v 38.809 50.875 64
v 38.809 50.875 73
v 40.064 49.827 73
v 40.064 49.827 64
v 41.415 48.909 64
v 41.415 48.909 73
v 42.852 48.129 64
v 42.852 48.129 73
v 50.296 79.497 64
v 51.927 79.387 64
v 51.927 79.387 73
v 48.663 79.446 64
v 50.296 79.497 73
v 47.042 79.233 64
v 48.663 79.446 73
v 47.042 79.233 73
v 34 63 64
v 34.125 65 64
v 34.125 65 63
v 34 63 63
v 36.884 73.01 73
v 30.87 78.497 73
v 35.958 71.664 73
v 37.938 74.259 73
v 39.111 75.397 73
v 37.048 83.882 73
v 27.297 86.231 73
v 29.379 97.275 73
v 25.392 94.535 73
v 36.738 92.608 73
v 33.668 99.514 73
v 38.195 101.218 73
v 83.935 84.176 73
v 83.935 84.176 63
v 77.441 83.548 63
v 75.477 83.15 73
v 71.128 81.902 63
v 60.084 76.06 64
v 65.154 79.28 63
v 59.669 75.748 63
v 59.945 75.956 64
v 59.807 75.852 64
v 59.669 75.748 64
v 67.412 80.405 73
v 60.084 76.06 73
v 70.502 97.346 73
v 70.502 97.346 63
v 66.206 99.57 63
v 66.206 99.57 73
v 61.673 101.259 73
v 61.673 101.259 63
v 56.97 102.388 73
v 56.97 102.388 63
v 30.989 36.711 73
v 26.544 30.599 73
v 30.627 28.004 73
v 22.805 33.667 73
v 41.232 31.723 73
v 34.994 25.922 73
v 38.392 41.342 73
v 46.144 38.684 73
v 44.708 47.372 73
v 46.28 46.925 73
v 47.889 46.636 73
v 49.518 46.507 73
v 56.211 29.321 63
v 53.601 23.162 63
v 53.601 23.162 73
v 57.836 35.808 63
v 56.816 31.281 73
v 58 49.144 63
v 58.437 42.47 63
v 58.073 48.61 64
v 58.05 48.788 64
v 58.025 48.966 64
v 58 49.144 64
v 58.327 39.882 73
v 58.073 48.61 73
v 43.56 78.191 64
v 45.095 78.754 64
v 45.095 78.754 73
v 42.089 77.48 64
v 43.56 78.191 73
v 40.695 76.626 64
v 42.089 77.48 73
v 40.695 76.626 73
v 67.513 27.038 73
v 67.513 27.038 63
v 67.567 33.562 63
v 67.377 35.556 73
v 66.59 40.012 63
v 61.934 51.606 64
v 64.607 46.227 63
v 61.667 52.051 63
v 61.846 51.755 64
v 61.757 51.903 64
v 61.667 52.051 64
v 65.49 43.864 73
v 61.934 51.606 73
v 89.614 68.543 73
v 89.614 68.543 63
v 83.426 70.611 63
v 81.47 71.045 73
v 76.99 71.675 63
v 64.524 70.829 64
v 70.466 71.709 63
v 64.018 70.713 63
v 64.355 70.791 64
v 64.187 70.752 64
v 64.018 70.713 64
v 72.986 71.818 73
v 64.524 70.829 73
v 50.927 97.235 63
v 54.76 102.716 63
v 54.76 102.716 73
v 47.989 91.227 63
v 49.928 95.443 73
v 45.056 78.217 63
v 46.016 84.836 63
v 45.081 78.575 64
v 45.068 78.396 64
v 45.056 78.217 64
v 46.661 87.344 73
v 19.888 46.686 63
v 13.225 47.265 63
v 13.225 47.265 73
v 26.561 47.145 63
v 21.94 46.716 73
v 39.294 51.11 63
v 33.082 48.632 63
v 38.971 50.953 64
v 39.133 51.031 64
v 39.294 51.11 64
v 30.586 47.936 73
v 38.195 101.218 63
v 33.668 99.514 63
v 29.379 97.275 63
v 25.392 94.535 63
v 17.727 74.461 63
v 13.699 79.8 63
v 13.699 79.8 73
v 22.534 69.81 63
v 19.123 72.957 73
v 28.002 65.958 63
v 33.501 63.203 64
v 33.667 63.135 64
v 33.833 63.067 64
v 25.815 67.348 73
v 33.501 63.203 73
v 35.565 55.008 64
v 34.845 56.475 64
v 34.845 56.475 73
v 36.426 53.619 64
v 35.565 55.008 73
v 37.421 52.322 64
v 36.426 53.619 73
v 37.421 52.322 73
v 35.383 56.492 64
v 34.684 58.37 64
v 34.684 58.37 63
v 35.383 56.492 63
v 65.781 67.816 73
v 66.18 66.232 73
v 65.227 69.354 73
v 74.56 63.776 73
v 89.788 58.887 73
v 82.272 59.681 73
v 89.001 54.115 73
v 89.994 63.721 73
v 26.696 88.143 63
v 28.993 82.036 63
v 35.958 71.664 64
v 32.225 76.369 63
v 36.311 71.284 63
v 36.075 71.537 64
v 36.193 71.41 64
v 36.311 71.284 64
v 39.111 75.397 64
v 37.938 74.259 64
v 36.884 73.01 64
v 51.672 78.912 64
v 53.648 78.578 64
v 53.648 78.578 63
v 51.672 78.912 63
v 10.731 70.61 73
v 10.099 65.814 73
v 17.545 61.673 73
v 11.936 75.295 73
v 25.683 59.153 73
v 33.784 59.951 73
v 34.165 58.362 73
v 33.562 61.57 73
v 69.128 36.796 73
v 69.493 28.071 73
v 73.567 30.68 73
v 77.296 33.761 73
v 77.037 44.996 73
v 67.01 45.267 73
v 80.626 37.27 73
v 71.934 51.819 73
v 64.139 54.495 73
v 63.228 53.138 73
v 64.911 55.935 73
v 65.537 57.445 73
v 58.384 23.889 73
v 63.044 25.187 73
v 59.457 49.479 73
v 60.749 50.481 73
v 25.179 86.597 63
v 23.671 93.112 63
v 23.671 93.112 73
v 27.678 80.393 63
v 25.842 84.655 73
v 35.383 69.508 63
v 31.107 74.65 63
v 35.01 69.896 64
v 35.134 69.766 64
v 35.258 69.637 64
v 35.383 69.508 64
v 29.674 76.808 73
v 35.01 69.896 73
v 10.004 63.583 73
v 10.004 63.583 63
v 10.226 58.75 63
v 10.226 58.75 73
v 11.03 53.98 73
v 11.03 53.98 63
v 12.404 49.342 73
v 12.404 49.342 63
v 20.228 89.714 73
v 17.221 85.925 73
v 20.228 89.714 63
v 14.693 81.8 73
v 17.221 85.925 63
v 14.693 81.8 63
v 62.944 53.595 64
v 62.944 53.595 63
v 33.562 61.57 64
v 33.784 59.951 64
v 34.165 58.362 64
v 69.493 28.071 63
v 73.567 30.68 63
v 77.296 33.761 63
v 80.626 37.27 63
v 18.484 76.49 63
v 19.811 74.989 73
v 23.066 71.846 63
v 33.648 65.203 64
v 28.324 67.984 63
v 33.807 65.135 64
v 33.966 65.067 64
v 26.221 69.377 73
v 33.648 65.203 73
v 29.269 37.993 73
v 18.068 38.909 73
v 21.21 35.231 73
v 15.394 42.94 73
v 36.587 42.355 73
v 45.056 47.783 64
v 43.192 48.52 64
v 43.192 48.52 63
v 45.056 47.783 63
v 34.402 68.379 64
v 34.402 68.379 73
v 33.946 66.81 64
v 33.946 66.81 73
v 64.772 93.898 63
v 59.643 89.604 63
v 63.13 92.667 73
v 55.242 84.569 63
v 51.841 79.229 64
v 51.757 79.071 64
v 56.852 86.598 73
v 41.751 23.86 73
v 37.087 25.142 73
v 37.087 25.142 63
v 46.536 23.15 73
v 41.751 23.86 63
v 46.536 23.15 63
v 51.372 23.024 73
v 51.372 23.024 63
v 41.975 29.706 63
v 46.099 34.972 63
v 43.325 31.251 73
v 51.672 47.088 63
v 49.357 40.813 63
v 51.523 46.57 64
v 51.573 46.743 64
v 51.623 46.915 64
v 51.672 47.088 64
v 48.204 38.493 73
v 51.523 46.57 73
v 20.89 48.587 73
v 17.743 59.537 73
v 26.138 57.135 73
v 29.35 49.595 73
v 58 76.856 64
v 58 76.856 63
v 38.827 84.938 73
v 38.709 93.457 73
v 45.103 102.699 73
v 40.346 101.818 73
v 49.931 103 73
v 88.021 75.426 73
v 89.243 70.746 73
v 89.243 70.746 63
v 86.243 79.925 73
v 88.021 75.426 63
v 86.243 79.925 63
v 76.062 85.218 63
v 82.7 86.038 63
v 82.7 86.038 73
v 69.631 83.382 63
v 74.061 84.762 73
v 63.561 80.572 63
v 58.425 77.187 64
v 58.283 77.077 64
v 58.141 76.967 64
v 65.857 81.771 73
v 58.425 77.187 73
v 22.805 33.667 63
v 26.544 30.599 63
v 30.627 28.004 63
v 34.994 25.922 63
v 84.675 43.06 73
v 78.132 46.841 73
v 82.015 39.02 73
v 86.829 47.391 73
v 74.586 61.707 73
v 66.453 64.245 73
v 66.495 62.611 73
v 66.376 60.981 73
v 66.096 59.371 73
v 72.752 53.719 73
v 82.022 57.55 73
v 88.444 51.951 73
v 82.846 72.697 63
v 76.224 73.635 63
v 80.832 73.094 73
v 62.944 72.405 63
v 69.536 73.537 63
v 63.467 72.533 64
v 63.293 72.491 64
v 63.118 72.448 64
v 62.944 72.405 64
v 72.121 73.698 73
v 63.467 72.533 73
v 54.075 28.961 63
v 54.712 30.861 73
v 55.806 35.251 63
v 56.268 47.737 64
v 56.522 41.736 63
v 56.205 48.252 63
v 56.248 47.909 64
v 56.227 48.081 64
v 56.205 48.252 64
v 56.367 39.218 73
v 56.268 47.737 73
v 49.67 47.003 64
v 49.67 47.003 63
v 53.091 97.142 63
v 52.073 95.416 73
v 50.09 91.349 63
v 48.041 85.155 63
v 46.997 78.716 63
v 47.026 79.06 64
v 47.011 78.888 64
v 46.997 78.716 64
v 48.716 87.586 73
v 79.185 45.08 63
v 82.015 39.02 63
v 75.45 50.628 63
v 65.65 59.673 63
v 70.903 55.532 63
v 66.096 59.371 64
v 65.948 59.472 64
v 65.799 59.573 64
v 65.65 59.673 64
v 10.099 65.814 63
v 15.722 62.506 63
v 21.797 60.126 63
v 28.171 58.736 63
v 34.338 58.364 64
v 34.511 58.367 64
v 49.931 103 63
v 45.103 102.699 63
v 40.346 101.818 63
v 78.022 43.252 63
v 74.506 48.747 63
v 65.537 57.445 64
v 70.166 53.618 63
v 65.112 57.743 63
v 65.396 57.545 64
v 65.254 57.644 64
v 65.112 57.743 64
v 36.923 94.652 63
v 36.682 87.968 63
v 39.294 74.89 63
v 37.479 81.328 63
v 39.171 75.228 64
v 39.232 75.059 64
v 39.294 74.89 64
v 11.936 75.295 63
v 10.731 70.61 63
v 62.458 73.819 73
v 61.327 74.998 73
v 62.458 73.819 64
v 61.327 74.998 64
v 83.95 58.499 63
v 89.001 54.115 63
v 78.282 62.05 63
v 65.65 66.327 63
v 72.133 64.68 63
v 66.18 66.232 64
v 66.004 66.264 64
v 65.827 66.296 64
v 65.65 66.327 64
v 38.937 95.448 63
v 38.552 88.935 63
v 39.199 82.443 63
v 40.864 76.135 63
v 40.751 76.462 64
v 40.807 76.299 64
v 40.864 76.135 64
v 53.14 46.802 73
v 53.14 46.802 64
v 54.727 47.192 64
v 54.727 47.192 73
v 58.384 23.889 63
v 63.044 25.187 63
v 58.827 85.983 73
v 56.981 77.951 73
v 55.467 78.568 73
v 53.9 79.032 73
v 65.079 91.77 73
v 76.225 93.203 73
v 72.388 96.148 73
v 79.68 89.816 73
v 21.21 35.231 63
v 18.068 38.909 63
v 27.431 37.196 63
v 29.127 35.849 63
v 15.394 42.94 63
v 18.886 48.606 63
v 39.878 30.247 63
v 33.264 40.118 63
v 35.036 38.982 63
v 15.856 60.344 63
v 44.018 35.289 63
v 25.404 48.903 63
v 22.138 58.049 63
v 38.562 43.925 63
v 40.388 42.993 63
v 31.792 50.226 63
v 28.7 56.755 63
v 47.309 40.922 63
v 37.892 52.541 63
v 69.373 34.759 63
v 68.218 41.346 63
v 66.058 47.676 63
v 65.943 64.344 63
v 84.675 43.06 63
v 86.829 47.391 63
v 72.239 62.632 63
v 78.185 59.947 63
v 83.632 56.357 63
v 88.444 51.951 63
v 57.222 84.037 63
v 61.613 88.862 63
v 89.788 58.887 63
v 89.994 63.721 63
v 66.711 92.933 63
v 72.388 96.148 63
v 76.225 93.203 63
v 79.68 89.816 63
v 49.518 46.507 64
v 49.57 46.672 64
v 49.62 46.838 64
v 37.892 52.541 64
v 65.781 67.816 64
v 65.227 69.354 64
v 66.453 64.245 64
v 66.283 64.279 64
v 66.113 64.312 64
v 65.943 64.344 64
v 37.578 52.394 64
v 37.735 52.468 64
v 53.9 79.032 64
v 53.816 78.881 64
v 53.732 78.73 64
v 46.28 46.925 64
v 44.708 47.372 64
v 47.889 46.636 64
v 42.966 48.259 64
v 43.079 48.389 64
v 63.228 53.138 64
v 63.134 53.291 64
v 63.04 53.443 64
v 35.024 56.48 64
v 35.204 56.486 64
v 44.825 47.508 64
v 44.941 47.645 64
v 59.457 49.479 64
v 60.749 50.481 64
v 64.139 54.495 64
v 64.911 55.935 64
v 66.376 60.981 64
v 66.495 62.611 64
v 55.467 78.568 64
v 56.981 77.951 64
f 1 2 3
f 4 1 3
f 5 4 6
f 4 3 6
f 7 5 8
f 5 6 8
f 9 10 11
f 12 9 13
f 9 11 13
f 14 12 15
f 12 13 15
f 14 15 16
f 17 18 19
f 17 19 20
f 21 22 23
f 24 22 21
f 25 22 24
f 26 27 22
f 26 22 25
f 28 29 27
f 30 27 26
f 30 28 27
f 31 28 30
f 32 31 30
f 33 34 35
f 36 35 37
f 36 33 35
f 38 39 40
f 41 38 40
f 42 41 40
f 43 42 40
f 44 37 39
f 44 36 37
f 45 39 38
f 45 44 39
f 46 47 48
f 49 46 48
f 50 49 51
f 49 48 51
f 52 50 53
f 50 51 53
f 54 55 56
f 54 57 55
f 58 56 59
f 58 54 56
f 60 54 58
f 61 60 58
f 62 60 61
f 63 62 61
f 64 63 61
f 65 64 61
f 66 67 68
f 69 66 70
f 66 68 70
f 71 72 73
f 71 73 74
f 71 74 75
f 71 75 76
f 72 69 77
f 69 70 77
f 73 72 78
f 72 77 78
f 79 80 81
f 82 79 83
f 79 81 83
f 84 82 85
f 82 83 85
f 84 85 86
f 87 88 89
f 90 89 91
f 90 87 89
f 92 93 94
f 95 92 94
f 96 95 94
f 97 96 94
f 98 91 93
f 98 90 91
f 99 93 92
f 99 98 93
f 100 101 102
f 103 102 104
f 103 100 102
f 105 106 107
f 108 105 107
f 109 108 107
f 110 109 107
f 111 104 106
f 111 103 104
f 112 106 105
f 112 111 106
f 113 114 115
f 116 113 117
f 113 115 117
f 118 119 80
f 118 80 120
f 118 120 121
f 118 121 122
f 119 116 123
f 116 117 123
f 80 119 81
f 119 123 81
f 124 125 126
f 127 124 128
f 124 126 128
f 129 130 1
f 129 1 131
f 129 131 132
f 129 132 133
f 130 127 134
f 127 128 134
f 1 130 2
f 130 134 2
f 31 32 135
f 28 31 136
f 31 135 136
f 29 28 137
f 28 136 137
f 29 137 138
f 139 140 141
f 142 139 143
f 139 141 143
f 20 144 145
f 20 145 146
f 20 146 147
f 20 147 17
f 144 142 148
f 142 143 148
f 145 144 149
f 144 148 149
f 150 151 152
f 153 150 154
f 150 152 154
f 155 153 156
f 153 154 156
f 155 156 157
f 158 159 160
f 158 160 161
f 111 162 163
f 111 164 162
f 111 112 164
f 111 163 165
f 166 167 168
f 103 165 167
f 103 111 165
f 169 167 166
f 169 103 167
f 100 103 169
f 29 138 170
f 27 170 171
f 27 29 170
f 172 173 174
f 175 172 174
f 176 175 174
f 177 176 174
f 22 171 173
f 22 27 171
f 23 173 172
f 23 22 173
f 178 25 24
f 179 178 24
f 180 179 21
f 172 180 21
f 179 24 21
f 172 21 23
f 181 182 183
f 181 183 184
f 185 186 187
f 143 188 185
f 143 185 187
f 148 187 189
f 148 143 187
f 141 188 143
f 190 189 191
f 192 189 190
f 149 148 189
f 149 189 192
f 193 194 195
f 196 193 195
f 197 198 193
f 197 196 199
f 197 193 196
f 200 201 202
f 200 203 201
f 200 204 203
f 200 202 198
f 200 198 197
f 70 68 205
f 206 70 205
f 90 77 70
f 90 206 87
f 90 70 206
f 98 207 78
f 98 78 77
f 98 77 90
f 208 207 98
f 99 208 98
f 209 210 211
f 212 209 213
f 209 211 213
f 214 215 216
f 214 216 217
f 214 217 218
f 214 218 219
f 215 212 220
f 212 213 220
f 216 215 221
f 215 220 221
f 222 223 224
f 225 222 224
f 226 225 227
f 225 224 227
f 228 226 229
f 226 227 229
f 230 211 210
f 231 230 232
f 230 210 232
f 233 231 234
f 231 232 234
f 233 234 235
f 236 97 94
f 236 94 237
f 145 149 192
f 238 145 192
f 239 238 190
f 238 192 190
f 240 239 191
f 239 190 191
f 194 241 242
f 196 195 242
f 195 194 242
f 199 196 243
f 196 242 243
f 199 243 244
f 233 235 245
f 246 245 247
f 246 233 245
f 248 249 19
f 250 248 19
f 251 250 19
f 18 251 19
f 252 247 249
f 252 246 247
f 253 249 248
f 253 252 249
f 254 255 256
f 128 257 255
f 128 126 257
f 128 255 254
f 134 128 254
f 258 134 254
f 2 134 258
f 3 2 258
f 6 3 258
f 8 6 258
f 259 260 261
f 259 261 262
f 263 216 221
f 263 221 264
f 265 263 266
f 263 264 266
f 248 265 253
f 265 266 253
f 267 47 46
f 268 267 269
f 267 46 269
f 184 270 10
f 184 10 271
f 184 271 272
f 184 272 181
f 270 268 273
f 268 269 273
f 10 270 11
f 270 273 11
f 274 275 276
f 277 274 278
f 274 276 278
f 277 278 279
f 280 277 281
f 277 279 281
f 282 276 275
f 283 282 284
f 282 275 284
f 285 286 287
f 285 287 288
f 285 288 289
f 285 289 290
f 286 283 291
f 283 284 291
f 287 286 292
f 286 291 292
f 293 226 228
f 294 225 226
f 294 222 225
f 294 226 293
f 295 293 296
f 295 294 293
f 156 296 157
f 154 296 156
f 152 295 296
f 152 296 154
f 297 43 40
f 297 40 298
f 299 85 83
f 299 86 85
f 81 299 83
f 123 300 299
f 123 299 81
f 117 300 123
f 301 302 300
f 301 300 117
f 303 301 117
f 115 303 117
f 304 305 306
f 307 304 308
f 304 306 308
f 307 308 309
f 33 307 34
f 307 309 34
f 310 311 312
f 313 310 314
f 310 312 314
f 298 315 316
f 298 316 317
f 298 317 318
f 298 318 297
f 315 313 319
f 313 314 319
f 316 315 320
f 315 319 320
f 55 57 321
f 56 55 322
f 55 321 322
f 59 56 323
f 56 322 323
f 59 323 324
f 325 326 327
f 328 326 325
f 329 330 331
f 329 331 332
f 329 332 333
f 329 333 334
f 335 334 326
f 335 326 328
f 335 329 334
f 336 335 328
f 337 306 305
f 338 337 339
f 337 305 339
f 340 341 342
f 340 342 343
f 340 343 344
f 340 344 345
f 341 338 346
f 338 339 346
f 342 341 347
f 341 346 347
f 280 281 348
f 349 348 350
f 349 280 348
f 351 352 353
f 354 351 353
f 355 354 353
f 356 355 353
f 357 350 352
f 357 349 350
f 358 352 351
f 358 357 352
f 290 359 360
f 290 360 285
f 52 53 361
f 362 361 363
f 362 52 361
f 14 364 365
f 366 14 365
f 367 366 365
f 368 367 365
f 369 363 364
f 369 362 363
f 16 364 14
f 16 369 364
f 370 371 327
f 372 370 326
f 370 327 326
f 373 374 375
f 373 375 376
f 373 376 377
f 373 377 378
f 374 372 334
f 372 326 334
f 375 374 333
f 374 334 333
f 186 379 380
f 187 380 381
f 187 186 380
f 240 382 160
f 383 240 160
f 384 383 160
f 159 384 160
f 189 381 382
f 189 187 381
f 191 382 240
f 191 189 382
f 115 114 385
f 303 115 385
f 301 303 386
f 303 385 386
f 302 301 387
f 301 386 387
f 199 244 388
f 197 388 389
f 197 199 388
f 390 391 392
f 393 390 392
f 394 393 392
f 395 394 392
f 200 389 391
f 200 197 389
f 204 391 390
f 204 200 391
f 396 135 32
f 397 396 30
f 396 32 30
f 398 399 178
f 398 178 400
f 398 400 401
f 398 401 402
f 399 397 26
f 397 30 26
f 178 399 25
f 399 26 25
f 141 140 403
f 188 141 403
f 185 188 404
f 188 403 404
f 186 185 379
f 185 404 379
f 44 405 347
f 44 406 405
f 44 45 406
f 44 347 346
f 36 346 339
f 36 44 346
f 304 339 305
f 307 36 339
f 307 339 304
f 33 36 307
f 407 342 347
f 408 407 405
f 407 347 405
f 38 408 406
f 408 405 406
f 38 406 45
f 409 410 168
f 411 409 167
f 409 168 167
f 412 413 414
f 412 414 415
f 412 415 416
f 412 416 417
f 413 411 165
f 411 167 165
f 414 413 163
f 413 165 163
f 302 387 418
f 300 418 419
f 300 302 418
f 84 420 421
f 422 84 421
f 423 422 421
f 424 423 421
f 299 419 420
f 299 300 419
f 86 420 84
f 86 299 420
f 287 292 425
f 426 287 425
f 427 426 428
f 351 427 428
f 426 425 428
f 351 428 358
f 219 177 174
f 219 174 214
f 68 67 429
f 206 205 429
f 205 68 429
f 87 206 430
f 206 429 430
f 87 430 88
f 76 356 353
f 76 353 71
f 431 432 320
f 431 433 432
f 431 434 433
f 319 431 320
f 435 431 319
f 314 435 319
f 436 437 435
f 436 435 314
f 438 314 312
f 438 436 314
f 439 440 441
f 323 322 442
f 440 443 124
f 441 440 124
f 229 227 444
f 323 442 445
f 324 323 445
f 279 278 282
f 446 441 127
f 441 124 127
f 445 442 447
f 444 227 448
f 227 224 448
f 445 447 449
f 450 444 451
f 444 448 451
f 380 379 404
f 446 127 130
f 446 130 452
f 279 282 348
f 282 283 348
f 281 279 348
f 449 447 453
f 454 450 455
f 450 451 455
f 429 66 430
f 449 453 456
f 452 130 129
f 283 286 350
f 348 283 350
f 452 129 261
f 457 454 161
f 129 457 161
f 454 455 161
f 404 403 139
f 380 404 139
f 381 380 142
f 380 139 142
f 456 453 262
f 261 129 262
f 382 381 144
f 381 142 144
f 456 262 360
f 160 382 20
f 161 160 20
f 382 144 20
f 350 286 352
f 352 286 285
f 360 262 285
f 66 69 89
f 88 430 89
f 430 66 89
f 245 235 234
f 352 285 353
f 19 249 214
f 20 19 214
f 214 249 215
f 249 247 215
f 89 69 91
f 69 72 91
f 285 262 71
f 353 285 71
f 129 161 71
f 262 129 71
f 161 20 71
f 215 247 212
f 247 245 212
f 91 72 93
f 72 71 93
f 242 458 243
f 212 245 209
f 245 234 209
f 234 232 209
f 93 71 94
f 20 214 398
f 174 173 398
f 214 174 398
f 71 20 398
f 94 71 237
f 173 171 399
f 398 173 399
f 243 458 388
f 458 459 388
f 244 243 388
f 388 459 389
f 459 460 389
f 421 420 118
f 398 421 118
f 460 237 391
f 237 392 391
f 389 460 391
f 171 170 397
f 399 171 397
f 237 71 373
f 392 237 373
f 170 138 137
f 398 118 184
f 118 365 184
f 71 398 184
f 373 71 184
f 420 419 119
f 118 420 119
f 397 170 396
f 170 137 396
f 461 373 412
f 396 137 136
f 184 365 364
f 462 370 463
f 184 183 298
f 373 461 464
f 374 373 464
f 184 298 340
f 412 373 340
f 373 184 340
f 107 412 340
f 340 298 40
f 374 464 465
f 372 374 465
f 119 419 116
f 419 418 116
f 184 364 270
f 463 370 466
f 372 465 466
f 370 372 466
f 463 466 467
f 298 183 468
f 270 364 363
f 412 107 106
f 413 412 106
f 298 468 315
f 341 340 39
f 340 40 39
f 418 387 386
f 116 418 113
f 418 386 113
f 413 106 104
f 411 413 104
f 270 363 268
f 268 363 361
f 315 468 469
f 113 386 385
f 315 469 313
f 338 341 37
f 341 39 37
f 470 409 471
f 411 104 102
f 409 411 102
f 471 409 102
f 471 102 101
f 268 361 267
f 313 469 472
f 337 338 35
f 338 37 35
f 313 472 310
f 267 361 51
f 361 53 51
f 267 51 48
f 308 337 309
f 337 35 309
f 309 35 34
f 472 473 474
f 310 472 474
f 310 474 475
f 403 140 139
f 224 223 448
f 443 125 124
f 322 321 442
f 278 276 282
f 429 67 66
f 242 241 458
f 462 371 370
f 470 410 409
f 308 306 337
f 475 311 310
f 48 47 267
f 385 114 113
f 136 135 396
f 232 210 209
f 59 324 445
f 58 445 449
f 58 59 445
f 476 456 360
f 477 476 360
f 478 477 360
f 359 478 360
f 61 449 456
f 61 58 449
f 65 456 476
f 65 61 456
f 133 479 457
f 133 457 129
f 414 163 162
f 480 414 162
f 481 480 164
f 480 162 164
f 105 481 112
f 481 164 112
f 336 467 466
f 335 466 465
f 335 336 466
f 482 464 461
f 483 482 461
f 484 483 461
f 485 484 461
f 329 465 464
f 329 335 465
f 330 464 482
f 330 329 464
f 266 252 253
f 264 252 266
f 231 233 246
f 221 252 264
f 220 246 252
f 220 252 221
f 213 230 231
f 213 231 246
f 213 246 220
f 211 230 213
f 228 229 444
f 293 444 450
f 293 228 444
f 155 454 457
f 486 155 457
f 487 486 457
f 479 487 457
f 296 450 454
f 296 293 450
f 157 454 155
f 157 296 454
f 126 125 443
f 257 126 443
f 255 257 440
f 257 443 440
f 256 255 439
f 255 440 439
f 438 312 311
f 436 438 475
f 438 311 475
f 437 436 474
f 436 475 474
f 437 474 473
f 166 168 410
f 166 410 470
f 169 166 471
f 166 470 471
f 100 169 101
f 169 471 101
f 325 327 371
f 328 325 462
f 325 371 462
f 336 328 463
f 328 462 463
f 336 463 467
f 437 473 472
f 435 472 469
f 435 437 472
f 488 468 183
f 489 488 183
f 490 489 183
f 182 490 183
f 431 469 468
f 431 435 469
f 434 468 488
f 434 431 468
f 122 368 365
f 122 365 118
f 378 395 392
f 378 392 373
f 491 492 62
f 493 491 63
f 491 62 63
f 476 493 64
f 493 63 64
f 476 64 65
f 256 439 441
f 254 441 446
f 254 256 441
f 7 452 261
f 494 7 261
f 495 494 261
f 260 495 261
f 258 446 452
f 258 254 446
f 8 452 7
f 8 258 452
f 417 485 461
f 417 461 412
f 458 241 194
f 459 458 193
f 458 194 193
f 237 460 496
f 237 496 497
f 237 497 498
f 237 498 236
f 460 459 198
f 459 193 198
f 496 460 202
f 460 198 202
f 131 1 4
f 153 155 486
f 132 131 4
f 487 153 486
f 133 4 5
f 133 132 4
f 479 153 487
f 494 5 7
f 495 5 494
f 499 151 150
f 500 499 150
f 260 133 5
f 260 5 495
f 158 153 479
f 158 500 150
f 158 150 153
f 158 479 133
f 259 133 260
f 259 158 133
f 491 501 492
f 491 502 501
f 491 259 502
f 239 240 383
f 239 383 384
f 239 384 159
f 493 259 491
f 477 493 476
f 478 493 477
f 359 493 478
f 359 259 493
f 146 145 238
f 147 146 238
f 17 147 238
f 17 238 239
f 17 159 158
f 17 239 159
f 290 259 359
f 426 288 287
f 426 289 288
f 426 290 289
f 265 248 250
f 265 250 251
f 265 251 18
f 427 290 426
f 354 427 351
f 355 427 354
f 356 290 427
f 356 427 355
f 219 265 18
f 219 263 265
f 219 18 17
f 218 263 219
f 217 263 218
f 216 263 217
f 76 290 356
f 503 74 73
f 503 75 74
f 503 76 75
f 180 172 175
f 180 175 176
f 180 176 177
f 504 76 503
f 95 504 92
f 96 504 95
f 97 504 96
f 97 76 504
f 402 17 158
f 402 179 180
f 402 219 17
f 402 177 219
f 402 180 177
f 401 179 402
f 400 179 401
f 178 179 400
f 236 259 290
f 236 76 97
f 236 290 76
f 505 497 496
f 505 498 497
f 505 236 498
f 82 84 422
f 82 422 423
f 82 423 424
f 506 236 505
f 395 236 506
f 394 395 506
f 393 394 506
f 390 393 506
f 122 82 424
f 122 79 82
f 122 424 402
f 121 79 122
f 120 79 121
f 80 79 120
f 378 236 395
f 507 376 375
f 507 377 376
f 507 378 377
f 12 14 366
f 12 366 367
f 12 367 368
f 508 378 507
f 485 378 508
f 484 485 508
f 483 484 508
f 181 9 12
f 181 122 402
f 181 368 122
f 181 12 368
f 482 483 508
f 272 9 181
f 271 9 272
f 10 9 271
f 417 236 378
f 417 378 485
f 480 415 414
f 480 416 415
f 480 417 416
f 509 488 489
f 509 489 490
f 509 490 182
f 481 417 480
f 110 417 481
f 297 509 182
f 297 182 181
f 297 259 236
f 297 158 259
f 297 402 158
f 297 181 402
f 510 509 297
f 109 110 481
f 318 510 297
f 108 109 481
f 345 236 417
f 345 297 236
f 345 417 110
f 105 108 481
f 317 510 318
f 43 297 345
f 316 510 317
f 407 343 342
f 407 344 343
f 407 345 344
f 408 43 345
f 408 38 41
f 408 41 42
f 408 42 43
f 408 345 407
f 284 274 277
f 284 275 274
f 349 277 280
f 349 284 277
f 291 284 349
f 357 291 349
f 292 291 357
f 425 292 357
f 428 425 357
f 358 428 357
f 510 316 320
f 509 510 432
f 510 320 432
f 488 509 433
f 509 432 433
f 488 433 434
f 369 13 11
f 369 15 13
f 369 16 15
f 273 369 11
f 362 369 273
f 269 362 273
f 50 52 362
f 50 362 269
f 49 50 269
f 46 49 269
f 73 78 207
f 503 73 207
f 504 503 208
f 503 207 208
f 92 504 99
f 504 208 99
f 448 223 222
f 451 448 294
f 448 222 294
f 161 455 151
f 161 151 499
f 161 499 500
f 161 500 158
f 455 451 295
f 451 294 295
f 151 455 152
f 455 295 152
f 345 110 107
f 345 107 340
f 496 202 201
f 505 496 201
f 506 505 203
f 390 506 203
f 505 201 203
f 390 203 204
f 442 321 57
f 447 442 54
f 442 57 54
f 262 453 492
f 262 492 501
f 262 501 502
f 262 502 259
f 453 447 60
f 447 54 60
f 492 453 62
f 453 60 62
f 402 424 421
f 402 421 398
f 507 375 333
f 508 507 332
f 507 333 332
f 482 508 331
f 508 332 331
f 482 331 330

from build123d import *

# Parameters (mm, degrees)
SKETCH_R           = 40
PAD_DEPTH          = 10
POCKET_DEPTH       = 237.157334
POLARPATTERN_COUNT = 15
SKETCH002_R        = 16.5
POCKET001_DEPTH    = 9


with BuildPart() as part:
    # Sketch → Pad (new body)
    with BuildSketch(Plane.XY):
        Circle(SKETCH_R)
    extrude(amount=PAD_DEPTH)

    # Sketch001 (on Face1 of ShapeBinder) → Pocket (cut, through all)
    with BuildSketch(Plane.XY.offset(10)):
        with BuildLine():
            ThreePointArc((-36.92851, 17.8125), (-27.922716, 7.192654), (-16, 0))
            Line((-15.874508, 2), (-16, 0))
            ThreePointArc((-35.895192, 19.8125), (-27.374199, 9.232269), (-15.874508, 2))
            Line((-35.895192, 19.8125), (-36.92851, 17.8125))
        make_face()
    pocket = extrude(amount=-POCKET_DEPTH, mode=Mode.SUBTRACT)

    # PolarPattern: Pocket ×15 about axis
    polarpattern_axis = Axis((0, 0, 0), (0, 0, 1))
    for i in range(1, POLARPATTERN_COUNT):
        add(pocket.rotate(polarpattern_axis, i * 360 / POLARPATTERN_COUNT), mode=Mode.SUBTRACT)

    # Sketch002 (on Face4 of PolarPattern) → Pocket001 (cut)
    with BuildSketch(Plane.XY.offset(10)):
        Circle(SKETCH002_R)
    extrude(amount=-POCKET001_DEPTH, mode=Mode.SUBTRACT)


with BuildPart() as part_1:
    # Body placement: moved
    add(part.part.moved(Location((50, 63, 63))))


solid = part_1.part
